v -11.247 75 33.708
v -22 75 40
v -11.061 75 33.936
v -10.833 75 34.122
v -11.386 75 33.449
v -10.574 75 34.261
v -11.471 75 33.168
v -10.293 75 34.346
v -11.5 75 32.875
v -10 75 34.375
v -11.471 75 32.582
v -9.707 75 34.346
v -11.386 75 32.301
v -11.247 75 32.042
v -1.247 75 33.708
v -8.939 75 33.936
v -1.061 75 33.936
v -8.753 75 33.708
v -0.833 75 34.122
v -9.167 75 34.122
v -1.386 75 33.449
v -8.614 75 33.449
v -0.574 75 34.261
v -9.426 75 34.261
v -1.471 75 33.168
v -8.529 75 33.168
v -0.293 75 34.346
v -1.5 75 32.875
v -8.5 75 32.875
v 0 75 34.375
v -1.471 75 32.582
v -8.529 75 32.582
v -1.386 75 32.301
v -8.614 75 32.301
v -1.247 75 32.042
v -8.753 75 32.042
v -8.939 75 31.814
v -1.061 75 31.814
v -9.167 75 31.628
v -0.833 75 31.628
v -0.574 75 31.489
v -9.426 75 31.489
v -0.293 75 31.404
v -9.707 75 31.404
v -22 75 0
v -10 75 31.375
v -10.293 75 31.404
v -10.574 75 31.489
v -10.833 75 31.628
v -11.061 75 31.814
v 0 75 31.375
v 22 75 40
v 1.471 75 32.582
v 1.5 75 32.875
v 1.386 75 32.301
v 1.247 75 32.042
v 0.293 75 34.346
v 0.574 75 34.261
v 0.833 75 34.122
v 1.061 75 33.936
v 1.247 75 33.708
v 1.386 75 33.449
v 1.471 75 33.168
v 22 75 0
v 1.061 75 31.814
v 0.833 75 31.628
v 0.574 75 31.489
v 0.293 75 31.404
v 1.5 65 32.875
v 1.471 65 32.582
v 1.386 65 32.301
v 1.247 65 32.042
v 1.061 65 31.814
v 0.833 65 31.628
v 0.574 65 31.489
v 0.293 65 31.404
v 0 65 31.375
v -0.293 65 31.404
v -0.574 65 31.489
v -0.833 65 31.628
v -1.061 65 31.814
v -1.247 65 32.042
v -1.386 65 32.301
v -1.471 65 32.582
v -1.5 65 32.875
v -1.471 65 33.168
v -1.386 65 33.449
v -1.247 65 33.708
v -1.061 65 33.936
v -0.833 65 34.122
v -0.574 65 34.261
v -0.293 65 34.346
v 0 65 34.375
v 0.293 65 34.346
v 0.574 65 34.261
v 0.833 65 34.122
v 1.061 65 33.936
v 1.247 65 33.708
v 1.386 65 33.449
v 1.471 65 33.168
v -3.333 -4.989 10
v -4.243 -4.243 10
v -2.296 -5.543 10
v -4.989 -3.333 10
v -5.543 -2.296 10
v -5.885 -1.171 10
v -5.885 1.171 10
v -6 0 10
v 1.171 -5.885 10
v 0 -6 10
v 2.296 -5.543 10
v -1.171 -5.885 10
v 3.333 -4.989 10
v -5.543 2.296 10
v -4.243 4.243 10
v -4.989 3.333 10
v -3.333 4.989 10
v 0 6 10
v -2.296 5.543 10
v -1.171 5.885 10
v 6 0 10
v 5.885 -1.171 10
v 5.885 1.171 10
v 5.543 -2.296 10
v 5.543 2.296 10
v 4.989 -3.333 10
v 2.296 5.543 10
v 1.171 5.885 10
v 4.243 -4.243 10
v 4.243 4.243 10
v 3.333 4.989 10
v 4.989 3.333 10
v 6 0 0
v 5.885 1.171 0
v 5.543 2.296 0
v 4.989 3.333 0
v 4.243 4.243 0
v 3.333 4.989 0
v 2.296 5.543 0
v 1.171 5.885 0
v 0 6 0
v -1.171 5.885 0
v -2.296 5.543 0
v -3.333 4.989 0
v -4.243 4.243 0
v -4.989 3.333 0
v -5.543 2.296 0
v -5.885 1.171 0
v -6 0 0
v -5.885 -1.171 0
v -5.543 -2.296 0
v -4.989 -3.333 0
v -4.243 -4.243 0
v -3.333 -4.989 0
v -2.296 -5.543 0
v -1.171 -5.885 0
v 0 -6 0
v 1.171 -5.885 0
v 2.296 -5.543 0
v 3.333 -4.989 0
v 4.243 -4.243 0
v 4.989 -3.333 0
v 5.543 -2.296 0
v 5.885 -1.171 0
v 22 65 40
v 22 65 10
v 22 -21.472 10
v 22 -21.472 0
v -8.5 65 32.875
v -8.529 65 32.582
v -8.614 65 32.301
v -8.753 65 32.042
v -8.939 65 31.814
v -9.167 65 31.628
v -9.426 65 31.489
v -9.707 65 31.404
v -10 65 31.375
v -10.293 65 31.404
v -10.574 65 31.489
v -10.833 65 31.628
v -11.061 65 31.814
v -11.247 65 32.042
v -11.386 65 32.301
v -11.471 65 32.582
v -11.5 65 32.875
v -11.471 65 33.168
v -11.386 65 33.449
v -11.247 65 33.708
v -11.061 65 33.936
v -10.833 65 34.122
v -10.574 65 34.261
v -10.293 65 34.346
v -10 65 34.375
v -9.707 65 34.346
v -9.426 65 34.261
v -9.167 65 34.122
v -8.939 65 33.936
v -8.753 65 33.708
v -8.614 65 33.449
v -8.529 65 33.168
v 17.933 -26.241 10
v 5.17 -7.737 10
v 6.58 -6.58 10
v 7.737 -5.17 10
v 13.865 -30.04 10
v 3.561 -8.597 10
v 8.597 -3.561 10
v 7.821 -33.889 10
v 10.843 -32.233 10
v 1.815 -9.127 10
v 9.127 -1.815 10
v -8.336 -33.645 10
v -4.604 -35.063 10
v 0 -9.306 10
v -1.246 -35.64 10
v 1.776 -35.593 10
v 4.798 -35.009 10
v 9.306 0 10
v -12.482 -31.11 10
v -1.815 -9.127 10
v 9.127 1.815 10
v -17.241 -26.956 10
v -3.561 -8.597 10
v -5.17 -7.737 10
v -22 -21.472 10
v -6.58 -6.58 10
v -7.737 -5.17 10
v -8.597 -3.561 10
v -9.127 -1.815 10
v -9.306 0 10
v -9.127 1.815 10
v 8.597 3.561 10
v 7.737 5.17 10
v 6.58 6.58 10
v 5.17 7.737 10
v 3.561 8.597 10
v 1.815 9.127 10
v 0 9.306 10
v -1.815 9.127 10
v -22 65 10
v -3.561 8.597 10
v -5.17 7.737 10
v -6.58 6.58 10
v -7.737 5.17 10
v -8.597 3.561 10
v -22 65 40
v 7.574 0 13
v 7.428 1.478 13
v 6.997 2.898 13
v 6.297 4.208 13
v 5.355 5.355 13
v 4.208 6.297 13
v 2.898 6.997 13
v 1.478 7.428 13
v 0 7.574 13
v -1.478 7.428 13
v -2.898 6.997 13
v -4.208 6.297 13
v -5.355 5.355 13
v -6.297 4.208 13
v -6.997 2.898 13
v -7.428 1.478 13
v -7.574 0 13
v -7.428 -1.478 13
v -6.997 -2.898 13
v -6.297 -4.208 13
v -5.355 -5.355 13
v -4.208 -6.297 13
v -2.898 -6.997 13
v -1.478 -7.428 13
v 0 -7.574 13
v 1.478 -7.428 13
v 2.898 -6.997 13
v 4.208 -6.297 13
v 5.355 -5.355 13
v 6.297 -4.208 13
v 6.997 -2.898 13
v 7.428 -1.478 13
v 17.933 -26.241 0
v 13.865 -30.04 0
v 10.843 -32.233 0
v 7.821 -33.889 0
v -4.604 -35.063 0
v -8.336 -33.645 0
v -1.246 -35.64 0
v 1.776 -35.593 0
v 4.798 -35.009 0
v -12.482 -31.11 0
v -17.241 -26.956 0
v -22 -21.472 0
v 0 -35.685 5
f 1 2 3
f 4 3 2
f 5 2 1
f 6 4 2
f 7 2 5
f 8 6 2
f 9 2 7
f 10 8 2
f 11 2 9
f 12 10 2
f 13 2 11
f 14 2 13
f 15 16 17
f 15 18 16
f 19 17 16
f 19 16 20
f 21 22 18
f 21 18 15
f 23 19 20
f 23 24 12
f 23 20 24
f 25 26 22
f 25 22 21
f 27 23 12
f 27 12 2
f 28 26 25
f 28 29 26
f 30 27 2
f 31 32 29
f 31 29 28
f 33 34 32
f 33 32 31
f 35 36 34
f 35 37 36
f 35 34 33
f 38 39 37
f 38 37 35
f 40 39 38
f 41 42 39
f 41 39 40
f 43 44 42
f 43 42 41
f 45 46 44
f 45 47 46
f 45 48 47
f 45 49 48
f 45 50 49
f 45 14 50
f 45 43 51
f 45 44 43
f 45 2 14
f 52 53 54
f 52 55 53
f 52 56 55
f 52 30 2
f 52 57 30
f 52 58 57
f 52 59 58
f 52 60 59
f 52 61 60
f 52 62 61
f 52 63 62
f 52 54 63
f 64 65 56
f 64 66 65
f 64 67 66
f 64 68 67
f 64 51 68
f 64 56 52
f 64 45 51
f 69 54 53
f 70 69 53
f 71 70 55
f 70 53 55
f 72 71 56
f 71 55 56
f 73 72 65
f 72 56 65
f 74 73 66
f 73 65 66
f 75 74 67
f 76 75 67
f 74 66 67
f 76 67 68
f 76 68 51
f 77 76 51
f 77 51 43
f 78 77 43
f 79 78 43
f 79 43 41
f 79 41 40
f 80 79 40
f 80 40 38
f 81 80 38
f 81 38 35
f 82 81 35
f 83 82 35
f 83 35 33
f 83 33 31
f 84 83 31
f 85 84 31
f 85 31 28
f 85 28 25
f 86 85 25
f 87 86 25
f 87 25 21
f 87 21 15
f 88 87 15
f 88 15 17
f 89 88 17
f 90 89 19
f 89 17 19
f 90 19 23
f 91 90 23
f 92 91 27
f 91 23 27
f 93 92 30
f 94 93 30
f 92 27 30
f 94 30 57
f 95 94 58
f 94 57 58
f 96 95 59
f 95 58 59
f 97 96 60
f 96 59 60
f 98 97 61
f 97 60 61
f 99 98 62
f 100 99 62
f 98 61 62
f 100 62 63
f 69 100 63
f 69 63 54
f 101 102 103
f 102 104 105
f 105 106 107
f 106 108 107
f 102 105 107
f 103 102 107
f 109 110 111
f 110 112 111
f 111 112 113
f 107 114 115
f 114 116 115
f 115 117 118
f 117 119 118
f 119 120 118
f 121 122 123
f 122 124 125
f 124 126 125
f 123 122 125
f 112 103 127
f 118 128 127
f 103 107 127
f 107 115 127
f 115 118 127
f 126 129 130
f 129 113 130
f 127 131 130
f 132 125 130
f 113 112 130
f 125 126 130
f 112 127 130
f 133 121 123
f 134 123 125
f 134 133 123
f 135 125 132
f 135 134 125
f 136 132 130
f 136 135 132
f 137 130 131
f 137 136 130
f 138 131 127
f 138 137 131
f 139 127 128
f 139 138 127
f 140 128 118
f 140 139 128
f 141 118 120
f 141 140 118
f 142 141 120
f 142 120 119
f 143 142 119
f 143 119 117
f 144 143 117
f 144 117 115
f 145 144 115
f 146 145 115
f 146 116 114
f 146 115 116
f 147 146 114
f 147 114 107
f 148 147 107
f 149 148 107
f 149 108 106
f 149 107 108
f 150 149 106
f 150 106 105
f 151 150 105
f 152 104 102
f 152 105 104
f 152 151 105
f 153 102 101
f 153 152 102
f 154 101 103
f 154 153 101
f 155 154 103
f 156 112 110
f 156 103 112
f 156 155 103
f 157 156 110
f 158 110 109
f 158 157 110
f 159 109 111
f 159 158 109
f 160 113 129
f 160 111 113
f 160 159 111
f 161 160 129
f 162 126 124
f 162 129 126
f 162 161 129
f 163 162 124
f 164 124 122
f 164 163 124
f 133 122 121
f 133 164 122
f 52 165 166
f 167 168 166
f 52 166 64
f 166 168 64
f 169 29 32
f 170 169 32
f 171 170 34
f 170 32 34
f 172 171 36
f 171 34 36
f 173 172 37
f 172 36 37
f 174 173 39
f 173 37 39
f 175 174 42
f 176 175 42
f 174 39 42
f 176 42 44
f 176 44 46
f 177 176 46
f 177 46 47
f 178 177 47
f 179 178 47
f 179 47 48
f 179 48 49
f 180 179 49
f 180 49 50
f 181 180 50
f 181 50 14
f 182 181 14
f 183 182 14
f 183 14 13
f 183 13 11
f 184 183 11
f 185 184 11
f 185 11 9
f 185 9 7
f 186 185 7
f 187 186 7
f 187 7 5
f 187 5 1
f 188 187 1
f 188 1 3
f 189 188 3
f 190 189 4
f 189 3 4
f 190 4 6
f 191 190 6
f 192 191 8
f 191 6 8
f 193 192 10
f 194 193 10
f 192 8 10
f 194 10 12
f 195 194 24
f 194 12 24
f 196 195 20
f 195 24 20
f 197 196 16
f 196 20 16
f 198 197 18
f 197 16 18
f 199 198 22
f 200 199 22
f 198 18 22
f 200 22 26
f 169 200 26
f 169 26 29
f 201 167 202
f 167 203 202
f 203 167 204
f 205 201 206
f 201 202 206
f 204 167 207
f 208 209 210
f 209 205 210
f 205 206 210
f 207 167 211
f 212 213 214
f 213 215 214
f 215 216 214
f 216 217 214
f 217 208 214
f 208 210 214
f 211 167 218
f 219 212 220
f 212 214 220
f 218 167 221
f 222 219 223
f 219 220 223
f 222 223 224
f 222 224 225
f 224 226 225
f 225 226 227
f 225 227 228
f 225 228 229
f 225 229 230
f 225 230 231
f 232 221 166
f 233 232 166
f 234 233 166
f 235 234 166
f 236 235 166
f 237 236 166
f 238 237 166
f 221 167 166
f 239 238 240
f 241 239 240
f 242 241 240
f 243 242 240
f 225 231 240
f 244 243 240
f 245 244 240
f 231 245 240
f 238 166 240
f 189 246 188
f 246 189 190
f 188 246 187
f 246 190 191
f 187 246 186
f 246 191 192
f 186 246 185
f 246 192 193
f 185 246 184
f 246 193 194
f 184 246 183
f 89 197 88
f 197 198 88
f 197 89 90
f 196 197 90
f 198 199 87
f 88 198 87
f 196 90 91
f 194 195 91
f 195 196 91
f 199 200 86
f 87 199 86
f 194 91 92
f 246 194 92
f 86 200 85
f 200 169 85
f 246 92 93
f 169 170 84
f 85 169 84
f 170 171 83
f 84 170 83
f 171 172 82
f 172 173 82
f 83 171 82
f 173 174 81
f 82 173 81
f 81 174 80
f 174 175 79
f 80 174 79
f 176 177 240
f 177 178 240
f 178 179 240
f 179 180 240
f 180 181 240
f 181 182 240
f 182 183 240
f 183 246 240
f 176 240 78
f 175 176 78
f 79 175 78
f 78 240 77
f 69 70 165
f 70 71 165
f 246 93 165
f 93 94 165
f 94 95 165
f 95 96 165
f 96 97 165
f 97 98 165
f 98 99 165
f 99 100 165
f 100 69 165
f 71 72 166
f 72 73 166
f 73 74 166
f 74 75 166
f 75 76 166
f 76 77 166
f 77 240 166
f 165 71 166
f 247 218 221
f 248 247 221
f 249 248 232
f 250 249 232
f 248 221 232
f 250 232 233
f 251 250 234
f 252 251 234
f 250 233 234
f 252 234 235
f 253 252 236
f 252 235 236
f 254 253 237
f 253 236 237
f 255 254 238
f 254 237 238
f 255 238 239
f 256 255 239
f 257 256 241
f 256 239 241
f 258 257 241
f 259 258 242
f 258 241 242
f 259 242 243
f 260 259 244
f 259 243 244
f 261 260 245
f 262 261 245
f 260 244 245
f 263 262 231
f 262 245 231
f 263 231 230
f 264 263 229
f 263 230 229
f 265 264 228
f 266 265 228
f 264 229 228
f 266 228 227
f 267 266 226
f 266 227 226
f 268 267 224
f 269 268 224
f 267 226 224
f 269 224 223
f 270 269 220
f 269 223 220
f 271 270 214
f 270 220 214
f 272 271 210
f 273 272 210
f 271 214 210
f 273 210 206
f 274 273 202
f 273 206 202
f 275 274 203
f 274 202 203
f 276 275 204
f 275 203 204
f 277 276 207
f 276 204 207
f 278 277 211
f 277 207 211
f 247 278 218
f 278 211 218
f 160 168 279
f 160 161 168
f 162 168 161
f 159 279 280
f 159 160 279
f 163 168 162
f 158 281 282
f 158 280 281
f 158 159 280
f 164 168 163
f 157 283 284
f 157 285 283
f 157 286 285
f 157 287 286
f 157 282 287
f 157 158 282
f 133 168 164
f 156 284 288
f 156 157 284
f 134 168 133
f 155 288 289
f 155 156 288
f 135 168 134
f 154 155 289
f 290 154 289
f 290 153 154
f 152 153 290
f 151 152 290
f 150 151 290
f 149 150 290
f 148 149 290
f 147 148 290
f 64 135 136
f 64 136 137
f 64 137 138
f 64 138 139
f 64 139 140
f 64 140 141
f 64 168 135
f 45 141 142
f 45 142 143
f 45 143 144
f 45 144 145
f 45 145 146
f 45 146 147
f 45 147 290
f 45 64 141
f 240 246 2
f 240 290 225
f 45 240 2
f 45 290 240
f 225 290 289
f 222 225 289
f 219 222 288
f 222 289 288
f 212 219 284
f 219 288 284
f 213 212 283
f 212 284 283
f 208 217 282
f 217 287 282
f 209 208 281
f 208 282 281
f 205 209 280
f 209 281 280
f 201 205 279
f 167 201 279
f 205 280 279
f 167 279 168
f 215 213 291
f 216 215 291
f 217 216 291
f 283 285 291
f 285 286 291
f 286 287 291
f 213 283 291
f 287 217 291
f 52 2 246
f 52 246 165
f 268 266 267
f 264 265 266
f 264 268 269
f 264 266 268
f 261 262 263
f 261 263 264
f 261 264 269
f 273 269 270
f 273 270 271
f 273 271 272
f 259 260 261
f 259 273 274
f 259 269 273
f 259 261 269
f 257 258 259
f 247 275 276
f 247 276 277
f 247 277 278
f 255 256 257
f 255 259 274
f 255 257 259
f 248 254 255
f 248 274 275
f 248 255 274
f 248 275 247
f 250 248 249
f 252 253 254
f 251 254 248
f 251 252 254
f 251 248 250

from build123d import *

# Parameters (mm, degrees)
EXTRUDE_1_DEPTH        = 10
SKETCH_1_R             = 6
CUT_EXTRUDE_1_DEPTH    = 23
SKETCH_3_W             = 44
SKETCH_3_H             = 10
EXTRUDE_2_DEPTH        = 30
SKETCH_4_R             = 1.5
CUT_EXTRUDE_2_DEPTH    = 15
PATTERN_LINEAR_1_COUNT = 2
PATTERN_LINEAR_1_PITCH = 10
SKETCH_5_R             = 7.573705131
EXTRUDE_3_DEPTH        = 3
DRAFT_1_ANGLE          = 30


with BuildPart() as part:
    # 草图2 → 凸台-拉伸1 (new body)
    with BuildSketch(Plane.XY):
        with BuildLine():
            Line((-22, 75), (22, 75))
            Line((22, 75), (22, -21.471774194))
            add(Edge.make_bspline(
                [(-22, -21.471774194), (0, -49.899193548), (22, -21.471774194)],
                knots=[0, 0, 0, 1, 1, 1], degree=2))
            Line((-22, -21.471774194), (-22, 75))
        make_face()
    extrude(amount=EXTRUDE_1_DEPTH)

    # 草图1 → 切除-拉伸1 (cut)
    with BuildSketch(Plane.XY):
        Circle(SKETCH_1_R)
    extrude(amount=CUT_EXTRUDE_1_DEPTH, mode=Mode.SUBTRACT)

    # 草图3 → 凸台-拉伸2 (add)
    with BuildSketch(Plane.XY.offset(10)):
        with Locations((0, 70)):
            Rectangle(SKETCH_3_W, SKETCH_3_H)
    extrude(amount=EXTRUDE_2_DEPTH)

    # 草图4 → 切除-拉伸2 (cut)
    with BuildSketch(Plane(origin=(0, 75, 0), x_dir=(1, 0, 0), z_dir=(0, 1, 0))):
        with Locations((0, -32.875114596)):
            Circle(SKETCH_4_R)
    cut_extrude_2 = extrude(amount=-CUT_EXTRUDE_2_DEPTH, mode=Mode.SUBTRACT)

    # 阵列(线性)1: 切除-拉伸2 ×2
    with Locations(*[(-i * PATTERN_LINEAR_1_PITCH, 0, 0) for i in range(1, PATTERN_LINEAR_1_COUNT)]):
        add(cut_extrude_2, mode=Mode.SUBTRACT)

    # 草图5 → 凸台-拉伸3 (add)
    with BuildSketch(Plane.XY.offset(10)):
        Circle(SKETCH_5_R)
    extrude(amount=EXTRUDE_3_DEPTH)

    # 拔模1
    draft_1_faces = [part.faces().sort_by_distance(p)[0] for p in [
        (-7.573705131, 0, 11.5),
    ]]
    draft(draft_1_faces, Plane.XY.offset(13), DRAFT_1_ANGLE)


solid = part.part
